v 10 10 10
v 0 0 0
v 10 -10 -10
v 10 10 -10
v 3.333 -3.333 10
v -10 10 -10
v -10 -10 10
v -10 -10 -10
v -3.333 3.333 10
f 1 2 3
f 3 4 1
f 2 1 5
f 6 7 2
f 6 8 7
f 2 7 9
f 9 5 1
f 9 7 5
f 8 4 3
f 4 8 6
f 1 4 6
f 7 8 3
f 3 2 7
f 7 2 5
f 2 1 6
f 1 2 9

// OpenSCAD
module m1()rotate([0,45,0])linear_extrude(100) translate([0,-2*sqrt(0),0])polygon(points=[[0,0],[10*sqrt(2),-10],[-10*sqrt(2),-10]],path=[1,2,3]);
difference(){cube(20,center=true); m1(); rotate(180) m1();
mirror([1,1,0]){m1();rotate(180)m1();}};
